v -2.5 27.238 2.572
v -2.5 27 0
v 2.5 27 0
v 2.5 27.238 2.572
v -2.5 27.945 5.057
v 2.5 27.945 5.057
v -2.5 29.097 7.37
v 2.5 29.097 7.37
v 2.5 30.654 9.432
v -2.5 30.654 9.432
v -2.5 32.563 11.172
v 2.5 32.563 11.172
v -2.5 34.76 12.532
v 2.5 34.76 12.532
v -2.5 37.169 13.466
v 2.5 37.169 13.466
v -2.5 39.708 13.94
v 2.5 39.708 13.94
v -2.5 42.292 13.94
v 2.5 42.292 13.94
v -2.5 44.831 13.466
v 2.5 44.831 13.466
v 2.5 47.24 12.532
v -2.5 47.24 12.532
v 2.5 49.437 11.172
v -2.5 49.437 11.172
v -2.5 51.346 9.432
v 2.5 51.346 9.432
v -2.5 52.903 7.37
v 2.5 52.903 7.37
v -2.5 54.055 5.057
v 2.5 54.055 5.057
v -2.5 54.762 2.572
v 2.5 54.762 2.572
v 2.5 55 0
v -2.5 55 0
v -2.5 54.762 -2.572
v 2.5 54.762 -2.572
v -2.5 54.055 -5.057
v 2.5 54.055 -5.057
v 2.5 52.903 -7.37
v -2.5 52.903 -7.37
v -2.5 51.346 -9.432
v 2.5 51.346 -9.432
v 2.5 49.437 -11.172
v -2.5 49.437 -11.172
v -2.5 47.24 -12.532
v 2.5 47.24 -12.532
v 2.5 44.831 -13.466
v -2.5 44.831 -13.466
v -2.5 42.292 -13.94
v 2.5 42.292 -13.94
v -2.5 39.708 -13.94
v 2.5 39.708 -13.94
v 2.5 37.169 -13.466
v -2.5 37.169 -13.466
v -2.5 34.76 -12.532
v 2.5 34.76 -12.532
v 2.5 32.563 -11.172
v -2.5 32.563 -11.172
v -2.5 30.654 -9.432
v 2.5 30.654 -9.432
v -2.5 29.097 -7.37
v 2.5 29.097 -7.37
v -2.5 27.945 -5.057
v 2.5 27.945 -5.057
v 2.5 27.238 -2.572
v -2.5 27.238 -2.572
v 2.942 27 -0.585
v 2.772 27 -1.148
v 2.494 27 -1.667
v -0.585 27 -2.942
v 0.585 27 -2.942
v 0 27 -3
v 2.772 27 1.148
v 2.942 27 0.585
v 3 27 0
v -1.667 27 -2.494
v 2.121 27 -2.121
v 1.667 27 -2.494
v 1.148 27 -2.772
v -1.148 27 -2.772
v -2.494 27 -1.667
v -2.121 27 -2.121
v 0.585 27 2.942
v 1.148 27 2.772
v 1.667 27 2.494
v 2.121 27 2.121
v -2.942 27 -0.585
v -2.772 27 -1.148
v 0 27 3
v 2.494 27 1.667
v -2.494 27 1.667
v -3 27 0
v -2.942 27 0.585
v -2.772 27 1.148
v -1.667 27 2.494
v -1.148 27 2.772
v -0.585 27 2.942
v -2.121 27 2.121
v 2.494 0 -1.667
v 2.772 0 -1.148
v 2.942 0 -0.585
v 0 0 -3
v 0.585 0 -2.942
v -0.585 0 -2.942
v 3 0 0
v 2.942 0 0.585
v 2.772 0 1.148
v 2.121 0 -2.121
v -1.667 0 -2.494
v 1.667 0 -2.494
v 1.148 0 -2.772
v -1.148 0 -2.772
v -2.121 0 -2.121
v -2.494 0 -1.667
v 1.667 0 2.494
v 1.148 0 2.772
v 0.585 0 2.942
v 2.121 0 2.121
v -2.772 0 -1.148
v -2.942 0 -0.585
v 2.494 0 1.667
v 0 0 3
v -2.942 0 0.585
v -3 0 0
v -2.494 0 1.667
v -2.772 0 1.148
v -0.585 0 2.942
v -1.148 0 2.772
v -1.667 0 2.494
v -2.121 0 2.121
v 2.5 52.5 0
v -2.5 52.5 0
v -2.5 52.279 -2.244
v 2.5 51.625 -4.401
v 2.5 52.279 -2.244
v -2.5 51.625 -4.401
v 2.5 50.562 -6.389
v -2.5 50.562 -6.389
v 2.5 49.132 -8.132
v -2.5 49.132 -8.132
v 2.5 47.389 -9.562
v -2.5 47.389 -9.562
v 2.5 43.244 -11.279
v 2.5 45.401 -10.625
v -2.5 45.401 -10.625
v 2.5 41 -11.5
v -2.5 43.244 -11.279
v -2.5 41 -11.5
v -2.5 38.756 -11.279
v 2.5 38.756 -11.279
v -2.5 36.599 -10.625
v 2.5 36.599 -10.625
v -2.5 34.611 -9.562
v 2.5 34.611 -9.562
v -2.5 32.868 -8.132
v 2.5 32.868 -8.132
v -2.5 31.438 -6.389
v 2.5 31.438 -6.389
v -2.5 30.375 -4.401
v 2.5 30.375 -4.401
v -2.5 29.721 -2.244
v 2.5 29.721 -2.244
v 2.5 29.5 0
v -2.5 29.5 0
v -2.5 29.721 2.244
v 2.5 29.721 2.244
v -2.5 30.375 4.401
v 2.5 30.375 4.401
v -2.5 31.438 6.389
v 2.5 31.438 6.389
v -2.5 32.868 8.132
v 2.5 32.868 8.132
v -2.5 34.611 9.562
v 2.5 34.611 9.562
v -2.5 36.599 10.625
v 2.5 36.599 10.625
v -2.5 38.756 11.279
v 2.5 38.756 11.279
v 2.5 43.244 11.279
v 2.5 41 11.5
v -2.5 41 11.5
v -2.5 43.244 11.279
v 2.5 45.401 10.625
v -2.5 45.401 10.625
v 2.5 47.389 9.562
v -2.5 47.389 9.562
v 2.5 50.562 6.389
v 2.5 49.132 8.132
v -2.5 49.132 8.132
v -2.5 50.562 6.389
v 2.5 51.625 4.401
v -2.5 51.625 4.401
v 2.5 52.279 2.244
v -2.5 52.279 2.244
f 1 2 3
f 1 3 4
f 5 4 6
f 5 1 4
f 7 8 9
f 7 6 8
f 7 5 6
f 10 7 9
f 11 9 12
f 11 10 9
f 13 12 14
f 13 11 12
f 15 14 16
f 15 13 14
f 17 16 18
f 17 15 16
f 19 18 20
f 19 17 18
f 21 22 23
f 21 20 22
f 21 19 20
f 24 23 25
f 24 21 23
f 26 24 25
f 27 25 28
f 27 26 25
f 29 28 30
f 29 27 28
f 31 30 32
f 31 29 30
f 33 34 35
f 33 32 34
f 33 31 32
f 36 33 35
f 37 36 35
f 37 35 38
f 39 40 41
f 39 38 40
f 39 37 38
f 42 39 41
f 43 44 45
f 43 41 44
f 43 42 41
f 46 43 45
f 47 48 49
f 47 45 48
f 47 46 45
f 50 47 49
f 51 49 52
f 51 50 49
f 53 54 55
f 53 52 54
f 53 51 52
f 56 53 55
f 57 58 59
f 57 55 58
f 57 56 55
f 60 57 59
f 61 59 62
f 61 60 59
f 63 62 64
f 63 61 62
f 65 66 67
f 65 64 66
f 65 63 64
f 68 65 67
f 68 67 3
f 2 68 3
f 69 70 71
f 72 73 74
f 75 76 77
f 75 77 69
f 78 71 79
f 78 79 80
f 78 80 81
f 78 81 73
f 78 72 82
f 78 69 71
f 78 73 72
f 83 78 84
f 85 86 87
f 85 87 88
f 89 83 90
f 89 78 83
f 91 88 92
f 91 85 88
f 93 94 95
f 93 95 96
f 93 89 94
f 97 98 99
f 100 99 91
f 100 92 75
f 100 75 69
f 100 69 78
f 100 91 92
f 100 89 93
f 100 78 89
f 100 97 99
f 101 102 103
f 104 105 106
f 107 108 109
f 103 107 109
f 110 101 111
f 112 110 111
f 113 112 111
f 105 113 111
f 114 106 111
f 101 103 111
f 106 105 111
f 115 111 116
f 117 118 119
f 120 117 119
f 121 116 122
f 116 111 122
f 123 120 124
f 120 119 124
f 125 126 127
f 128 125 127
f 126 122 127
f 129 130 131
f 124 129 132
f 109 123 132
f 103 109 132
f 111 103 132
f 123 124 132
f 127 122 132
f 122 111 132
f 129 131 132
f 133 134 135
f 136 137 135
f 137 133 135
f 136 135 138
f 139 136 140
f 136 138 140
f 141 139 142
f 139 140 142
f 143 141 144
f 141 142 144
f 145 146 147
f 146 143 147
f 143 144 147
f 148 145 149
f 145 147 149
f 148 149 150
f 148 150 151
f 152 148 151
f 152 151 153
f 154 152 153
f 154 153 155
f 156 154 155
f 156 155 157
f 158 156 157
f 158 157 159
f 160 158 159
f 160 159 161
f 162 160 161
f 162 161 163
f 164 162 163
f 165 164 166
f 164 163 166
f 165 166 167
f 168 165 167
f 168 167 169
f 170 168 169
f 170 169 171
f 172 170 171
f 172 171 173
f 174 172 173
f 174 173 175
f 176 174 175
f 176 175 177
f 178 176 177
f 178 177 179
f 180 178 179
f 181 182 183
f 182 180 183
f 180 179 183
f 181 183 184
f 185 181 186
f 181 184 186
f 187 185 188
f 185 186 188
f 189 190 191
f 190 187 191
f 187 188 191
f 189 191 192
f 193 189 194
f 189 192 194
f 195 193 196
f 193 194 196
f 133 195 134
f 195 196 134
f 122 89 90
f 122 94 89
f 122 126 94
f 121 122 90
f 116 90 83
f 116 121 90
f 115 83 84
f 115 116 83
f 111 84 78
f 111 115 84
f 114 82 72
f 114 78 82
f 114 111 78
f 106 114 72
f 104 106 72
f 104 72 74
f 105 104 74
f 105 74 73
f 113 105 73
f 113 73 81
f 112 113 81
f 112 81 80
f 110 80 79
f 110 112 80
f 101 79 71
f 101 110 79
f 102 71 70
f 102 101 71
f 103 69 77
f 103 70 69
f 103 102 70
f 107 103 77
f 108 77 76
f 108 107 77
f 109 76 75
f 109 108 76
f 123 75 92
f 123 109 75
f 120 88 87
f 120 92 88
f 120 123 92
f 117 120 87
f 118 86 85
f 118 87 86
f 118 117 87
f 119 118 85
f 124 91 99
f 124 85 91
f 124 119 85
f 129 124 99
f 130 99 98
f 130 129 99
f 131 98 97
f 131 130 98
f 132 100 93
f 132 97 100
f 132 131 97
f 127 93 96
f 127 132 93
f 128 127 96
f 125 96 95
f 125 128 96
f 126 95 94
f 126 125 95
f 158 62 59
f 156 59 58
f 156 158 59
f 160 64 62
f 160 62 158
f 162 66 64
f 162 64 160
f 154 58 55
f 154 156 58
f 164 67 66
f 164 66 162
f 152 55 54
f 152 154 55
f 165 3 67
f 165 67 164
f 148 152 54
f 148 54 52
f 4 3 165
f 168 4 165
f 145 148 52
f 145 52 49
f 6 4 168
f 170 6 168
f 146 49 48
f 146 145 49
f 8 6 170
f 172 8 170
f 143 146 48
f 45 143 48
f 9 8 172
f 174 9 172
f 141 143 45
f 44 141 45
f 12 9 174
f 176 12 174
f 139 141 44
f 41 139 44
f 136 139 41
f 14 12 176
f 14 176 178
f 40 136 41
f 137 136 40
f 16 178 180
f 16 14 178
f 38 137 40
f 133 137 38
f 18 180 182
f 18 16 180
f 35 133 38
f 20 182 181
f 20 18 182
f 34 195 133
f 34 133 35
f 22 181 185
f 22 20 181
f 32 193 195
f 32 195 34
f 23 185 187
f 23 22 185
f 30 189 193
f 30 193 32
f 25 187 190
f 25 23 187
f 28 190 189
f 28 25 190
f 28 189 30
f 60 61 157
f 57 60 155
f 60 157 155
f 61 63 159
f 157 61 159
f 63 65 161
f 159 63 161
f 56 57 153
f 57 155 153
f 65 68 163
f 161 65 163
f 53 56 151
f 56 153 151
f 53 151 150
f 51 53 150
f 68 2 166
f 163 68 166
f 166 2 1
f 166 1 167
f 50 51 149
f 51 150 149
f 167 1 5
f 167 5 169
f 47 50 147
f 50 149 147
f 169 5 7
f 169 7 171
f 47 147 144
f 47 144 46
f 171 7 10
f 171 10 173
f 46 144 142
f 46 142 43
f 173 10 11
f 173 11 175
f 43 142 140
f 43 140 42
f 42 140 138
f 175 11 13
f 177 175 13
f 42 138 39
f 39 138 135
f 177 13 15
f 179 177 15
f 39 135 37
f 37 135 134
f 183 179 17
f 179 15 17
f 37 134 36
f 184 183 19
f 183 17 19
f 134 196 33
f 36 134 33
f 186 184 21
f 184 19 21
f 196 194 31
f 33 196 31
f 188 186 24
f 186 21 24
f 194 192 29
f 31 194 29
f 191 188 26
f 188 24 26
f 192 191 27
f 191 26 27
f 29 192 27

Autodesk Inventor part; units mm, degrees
ref_plane "YZ Plane" through (0, 0, 0) normal (1, 0, 0) x (0, 1, 0)
ref_plane "XZ Plane" through (0, 0, 0) normal (0, 1, 0) x (-1, 0, 0)
ref_plane "XY Plane" through (0, 0, 0) normal (0, 0, 1) x (1, 0, 0)
sketch "Sketch1" plane through (0, 0, 0) normal (0, 1, 0) x (-1, 0, 0)
  circle A0 centre (0, 0) radius 3
  dimension "d0" = 6
extrude "Extrusion1" add sketch "Sketch1" along normal blind 27
sketch "Sketch2" plane through (0, 0, 0) normal (1, 0, 0) x (0, 1, 0)
  line L0 (27, -3) -> (27, 3) projected
  line L1 (27, 0) -> (32.8849, 0)
  circle A0 centre (41, 0) radius 14
  circle A1 centre (41, 0) radius 11.5
  point P0 (0, 0)
  dimension "d4" = 28
  dimension "d7" = 23
extrude "Extrusion2" add sketch "Sketch2" along normal mid plane 5
properties part number "hook" material "Iron, Cast"
